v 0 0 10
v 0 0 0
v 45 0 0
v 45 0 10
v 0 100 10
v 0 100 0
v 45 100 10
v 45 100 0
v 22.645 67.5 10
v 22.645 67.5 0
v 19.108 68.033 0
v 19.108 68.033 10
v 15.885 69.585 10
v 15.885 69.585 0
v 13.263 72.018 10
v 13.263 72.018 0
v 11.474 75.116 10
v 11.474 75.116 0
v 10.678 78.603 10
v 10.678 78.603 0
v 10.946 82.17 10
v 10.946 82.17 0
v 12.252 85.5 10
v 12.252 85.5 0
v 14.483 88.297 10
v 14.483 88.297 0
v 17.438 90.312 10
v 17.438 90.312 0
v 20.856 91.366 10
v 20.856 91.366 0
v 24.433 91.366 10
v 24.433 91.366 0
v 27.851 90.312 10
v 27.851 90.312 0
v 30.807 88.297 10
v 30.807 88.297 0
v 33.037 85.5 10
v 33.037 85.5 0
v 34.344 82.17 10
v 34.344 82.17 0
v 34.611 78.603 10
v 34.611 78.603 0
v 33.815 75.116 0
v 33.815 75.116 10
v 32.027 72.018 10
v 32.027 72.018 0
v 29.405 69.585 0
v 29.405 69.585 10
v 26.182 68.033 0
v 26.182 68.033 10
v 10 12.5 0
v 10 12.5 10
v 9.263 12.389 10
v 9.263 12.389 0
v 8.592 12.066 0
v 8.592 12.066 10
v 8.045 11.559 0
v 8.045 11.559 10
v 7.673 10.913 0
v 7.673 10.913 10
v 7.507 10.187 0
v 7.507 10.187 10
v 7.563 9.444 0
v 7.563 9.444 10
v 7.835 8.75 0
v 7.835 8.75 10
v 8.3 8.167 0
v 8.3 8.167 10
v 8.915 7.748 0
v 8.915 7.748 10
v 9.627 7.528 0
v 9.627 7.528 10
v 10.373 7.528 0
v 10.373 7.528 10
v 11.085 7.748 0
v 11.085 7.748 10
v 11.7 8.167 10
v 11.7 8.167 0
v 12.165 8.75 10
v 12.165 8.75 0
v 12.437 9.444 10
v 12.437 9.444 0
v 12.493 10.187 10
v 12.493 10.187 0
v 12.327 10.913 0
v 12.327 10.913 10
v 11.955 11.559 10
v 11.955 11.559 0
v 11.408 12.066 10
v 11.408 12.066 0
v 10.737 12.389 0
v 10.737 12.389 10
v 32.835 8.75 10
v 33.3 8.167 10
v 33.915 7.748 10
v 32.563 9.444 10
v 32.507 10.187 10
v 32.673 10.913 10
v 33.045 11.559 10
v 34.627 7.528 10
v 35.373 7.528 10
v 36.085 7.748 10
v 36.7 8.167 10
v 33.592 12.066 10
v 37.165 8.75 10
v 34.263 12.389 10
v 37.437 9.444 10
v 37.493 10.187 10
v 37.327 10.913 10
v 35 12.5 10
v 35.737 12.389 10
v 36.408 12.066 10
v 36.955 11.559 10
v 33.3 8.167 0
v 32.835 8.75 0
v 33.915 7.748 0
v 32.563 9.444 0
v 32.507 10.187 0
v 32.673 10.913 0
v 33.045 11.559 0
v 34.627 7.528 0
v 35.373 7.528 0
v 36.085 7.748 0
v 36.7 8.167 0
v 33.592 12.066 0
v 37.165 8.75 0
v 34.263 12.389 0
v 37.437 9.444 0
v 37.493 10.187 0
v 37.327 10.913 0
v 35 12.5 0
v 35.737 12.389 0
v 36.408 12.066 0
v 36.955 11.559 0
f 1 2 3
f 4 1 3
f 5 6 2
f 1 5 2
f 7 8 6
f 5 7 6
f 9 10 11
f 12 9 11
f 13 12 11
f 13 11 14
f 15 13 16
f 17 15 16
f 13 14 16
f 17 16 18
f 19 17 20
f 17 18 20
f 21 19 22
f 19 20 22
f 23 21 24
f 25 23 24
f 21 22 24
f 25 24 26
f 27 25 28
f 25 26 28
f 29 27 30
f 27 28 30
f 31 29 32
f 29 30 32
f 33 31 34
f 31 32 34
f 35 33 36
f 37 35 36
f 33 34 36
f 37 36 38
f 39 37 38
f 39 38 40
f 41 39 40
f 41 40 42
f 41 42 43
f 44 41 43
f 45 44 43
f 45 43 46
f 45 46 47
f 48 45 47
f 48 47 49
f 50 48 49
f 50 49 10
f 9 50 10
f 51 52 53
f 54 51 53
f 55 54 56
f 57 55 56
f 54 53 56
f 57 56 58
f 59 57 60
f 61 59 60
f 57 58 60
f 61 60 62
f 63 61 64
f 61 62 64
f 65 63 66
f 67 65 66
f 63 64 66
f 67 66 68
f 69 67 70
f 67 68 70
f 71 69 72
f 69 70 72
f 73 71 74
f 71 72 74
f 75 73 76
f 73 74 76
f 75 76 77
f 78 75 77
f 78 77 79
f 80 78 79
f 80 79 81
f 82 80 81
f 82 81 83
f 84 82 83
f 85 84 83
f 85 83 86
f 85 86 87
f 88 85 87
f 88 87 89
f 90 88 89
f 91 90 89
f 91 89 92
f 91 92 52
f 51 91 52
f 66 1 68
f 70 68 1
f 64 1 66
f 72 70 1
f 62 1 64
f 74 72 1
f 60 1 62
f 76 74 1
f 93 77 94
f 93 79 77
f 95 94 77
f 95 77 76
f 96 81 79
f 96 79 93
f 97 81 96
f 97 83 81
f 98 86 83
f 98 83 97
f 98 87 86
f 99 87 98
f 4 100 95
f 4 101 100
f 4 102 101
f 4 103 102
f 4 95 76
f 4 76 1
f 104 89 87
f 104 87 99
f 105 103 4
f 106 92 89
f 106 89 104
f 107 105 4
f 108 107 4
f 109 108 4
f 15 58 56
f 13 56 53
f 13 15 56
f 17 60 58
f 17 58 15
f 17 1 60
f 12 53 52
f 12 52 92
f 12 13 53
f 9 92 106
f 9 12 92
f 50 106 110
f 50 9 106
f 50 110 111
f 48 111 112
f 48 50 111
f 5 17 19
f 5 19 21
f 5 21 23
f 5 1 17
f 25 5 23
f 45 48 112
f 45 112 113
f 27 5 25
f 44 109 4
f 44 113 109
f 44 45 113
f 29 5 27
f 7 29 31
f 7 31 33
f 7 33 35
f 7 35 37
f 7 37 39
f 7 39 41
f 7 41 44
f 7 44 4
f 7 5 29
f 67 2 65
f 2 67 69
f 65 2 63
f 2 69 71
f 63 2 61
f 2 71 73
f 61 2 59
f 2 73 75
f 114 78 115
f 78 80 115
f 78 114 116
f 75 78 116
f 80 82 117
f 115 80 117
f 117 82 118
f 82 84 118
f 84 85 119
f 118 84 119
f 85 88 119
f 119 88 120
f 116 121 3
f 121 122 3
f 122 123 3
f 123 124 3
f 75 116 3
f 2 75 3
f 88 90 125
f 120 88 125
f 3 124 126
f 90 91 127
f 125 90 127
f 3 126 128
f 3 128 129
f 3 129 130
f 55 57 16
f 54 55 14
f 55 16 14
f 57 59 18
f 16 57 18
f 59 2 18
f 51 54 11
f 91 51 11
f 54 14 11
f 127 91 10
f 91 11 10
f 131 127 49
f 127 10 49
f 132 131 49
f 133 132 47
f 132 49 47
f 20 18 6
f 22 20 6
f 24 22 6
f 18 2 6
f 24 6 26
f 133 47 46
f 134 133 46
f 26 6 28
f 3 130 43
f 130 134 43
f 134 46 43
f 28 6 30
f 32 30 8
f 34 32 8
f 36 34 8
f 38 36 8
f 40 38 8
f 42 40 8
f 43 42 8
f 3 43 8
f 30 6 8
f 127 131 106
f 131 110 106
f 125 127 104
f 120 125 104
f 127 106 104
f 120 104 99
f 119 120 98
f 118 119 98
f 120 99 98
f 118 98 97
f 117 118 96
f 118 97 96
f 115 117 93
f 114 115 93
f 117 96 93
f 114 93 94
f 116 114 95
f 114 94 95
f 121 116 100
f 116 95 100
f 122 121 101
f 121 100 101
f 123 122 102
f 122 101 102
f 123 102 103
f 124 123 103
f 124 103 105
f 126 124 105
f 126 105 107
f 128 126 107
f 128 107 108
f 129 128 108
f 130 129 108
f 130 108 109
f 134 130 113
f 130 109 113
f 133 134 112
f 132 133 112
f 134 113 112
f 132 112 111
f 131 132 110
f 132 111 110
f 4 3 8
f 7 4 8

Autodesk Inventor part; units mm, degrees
ref_plane "YZ Plane" through (0, 0, 0) normal (1, 0, 0) x (0, 1, 0)
ref_plane "XZ Plane" through (0, 0, 0) normal (0, 1, 0) x (-1, 0, 0)
ref_plane "XY Plane" through (0, 0, 0) normal (0, 0, 1) x (1, 0, 0)
sketch "スケッチ1" plane through (0, 0, 0) normal (0, 0, 1) x (1, 0, 0)
  line L0 (0, 0) -> (45, 0)
  line L1 (45, 0) -> (45, 100)
  line L2 (45, 100) -> (0, 100)
  line L3 (0, 100) -> (0, 0)
  dimension "d0" = 100
  dimension "d1" = 45
extrude "押し出し1" add sketch "スケッチ1" along normal blind 10
sketch "スケッチ2" plane through (0, 0, 10) normal (0, 0, 1) x (1, 0, 0)
  line L0 (0, 0) -> (45, 0) projected
  point P0 (22.6447, 79.5)
  dimension "d4" = 79.5
hole "穴1" at (22.6447, 79.5, 10) direction (0, 0, -1) diameter 24 end through all
sketch "スケッチ3" plane through (0, 0, 0) normal (0, 0, -1) x (-1, 0, 0)
  line L0 (0, 0) -> (-45, 0) projected
  line L1 (-45, 0) -> (-45, 100) projected
  line L2 (0, 100) -> (0, 0) projected
  point P0 (-10, 10)
  point P1 (-35, 10)
  dimension "d12" = 10
  dimension "d13" = 10
  dimension "d14" = 10
  dimension "d15" = 10
hole "穴2" at (10, 10, 0) at (35, 10, 0) direction (0, 0, 1) diameter 5 end through all
properties part number "回転軸取り付け板"
